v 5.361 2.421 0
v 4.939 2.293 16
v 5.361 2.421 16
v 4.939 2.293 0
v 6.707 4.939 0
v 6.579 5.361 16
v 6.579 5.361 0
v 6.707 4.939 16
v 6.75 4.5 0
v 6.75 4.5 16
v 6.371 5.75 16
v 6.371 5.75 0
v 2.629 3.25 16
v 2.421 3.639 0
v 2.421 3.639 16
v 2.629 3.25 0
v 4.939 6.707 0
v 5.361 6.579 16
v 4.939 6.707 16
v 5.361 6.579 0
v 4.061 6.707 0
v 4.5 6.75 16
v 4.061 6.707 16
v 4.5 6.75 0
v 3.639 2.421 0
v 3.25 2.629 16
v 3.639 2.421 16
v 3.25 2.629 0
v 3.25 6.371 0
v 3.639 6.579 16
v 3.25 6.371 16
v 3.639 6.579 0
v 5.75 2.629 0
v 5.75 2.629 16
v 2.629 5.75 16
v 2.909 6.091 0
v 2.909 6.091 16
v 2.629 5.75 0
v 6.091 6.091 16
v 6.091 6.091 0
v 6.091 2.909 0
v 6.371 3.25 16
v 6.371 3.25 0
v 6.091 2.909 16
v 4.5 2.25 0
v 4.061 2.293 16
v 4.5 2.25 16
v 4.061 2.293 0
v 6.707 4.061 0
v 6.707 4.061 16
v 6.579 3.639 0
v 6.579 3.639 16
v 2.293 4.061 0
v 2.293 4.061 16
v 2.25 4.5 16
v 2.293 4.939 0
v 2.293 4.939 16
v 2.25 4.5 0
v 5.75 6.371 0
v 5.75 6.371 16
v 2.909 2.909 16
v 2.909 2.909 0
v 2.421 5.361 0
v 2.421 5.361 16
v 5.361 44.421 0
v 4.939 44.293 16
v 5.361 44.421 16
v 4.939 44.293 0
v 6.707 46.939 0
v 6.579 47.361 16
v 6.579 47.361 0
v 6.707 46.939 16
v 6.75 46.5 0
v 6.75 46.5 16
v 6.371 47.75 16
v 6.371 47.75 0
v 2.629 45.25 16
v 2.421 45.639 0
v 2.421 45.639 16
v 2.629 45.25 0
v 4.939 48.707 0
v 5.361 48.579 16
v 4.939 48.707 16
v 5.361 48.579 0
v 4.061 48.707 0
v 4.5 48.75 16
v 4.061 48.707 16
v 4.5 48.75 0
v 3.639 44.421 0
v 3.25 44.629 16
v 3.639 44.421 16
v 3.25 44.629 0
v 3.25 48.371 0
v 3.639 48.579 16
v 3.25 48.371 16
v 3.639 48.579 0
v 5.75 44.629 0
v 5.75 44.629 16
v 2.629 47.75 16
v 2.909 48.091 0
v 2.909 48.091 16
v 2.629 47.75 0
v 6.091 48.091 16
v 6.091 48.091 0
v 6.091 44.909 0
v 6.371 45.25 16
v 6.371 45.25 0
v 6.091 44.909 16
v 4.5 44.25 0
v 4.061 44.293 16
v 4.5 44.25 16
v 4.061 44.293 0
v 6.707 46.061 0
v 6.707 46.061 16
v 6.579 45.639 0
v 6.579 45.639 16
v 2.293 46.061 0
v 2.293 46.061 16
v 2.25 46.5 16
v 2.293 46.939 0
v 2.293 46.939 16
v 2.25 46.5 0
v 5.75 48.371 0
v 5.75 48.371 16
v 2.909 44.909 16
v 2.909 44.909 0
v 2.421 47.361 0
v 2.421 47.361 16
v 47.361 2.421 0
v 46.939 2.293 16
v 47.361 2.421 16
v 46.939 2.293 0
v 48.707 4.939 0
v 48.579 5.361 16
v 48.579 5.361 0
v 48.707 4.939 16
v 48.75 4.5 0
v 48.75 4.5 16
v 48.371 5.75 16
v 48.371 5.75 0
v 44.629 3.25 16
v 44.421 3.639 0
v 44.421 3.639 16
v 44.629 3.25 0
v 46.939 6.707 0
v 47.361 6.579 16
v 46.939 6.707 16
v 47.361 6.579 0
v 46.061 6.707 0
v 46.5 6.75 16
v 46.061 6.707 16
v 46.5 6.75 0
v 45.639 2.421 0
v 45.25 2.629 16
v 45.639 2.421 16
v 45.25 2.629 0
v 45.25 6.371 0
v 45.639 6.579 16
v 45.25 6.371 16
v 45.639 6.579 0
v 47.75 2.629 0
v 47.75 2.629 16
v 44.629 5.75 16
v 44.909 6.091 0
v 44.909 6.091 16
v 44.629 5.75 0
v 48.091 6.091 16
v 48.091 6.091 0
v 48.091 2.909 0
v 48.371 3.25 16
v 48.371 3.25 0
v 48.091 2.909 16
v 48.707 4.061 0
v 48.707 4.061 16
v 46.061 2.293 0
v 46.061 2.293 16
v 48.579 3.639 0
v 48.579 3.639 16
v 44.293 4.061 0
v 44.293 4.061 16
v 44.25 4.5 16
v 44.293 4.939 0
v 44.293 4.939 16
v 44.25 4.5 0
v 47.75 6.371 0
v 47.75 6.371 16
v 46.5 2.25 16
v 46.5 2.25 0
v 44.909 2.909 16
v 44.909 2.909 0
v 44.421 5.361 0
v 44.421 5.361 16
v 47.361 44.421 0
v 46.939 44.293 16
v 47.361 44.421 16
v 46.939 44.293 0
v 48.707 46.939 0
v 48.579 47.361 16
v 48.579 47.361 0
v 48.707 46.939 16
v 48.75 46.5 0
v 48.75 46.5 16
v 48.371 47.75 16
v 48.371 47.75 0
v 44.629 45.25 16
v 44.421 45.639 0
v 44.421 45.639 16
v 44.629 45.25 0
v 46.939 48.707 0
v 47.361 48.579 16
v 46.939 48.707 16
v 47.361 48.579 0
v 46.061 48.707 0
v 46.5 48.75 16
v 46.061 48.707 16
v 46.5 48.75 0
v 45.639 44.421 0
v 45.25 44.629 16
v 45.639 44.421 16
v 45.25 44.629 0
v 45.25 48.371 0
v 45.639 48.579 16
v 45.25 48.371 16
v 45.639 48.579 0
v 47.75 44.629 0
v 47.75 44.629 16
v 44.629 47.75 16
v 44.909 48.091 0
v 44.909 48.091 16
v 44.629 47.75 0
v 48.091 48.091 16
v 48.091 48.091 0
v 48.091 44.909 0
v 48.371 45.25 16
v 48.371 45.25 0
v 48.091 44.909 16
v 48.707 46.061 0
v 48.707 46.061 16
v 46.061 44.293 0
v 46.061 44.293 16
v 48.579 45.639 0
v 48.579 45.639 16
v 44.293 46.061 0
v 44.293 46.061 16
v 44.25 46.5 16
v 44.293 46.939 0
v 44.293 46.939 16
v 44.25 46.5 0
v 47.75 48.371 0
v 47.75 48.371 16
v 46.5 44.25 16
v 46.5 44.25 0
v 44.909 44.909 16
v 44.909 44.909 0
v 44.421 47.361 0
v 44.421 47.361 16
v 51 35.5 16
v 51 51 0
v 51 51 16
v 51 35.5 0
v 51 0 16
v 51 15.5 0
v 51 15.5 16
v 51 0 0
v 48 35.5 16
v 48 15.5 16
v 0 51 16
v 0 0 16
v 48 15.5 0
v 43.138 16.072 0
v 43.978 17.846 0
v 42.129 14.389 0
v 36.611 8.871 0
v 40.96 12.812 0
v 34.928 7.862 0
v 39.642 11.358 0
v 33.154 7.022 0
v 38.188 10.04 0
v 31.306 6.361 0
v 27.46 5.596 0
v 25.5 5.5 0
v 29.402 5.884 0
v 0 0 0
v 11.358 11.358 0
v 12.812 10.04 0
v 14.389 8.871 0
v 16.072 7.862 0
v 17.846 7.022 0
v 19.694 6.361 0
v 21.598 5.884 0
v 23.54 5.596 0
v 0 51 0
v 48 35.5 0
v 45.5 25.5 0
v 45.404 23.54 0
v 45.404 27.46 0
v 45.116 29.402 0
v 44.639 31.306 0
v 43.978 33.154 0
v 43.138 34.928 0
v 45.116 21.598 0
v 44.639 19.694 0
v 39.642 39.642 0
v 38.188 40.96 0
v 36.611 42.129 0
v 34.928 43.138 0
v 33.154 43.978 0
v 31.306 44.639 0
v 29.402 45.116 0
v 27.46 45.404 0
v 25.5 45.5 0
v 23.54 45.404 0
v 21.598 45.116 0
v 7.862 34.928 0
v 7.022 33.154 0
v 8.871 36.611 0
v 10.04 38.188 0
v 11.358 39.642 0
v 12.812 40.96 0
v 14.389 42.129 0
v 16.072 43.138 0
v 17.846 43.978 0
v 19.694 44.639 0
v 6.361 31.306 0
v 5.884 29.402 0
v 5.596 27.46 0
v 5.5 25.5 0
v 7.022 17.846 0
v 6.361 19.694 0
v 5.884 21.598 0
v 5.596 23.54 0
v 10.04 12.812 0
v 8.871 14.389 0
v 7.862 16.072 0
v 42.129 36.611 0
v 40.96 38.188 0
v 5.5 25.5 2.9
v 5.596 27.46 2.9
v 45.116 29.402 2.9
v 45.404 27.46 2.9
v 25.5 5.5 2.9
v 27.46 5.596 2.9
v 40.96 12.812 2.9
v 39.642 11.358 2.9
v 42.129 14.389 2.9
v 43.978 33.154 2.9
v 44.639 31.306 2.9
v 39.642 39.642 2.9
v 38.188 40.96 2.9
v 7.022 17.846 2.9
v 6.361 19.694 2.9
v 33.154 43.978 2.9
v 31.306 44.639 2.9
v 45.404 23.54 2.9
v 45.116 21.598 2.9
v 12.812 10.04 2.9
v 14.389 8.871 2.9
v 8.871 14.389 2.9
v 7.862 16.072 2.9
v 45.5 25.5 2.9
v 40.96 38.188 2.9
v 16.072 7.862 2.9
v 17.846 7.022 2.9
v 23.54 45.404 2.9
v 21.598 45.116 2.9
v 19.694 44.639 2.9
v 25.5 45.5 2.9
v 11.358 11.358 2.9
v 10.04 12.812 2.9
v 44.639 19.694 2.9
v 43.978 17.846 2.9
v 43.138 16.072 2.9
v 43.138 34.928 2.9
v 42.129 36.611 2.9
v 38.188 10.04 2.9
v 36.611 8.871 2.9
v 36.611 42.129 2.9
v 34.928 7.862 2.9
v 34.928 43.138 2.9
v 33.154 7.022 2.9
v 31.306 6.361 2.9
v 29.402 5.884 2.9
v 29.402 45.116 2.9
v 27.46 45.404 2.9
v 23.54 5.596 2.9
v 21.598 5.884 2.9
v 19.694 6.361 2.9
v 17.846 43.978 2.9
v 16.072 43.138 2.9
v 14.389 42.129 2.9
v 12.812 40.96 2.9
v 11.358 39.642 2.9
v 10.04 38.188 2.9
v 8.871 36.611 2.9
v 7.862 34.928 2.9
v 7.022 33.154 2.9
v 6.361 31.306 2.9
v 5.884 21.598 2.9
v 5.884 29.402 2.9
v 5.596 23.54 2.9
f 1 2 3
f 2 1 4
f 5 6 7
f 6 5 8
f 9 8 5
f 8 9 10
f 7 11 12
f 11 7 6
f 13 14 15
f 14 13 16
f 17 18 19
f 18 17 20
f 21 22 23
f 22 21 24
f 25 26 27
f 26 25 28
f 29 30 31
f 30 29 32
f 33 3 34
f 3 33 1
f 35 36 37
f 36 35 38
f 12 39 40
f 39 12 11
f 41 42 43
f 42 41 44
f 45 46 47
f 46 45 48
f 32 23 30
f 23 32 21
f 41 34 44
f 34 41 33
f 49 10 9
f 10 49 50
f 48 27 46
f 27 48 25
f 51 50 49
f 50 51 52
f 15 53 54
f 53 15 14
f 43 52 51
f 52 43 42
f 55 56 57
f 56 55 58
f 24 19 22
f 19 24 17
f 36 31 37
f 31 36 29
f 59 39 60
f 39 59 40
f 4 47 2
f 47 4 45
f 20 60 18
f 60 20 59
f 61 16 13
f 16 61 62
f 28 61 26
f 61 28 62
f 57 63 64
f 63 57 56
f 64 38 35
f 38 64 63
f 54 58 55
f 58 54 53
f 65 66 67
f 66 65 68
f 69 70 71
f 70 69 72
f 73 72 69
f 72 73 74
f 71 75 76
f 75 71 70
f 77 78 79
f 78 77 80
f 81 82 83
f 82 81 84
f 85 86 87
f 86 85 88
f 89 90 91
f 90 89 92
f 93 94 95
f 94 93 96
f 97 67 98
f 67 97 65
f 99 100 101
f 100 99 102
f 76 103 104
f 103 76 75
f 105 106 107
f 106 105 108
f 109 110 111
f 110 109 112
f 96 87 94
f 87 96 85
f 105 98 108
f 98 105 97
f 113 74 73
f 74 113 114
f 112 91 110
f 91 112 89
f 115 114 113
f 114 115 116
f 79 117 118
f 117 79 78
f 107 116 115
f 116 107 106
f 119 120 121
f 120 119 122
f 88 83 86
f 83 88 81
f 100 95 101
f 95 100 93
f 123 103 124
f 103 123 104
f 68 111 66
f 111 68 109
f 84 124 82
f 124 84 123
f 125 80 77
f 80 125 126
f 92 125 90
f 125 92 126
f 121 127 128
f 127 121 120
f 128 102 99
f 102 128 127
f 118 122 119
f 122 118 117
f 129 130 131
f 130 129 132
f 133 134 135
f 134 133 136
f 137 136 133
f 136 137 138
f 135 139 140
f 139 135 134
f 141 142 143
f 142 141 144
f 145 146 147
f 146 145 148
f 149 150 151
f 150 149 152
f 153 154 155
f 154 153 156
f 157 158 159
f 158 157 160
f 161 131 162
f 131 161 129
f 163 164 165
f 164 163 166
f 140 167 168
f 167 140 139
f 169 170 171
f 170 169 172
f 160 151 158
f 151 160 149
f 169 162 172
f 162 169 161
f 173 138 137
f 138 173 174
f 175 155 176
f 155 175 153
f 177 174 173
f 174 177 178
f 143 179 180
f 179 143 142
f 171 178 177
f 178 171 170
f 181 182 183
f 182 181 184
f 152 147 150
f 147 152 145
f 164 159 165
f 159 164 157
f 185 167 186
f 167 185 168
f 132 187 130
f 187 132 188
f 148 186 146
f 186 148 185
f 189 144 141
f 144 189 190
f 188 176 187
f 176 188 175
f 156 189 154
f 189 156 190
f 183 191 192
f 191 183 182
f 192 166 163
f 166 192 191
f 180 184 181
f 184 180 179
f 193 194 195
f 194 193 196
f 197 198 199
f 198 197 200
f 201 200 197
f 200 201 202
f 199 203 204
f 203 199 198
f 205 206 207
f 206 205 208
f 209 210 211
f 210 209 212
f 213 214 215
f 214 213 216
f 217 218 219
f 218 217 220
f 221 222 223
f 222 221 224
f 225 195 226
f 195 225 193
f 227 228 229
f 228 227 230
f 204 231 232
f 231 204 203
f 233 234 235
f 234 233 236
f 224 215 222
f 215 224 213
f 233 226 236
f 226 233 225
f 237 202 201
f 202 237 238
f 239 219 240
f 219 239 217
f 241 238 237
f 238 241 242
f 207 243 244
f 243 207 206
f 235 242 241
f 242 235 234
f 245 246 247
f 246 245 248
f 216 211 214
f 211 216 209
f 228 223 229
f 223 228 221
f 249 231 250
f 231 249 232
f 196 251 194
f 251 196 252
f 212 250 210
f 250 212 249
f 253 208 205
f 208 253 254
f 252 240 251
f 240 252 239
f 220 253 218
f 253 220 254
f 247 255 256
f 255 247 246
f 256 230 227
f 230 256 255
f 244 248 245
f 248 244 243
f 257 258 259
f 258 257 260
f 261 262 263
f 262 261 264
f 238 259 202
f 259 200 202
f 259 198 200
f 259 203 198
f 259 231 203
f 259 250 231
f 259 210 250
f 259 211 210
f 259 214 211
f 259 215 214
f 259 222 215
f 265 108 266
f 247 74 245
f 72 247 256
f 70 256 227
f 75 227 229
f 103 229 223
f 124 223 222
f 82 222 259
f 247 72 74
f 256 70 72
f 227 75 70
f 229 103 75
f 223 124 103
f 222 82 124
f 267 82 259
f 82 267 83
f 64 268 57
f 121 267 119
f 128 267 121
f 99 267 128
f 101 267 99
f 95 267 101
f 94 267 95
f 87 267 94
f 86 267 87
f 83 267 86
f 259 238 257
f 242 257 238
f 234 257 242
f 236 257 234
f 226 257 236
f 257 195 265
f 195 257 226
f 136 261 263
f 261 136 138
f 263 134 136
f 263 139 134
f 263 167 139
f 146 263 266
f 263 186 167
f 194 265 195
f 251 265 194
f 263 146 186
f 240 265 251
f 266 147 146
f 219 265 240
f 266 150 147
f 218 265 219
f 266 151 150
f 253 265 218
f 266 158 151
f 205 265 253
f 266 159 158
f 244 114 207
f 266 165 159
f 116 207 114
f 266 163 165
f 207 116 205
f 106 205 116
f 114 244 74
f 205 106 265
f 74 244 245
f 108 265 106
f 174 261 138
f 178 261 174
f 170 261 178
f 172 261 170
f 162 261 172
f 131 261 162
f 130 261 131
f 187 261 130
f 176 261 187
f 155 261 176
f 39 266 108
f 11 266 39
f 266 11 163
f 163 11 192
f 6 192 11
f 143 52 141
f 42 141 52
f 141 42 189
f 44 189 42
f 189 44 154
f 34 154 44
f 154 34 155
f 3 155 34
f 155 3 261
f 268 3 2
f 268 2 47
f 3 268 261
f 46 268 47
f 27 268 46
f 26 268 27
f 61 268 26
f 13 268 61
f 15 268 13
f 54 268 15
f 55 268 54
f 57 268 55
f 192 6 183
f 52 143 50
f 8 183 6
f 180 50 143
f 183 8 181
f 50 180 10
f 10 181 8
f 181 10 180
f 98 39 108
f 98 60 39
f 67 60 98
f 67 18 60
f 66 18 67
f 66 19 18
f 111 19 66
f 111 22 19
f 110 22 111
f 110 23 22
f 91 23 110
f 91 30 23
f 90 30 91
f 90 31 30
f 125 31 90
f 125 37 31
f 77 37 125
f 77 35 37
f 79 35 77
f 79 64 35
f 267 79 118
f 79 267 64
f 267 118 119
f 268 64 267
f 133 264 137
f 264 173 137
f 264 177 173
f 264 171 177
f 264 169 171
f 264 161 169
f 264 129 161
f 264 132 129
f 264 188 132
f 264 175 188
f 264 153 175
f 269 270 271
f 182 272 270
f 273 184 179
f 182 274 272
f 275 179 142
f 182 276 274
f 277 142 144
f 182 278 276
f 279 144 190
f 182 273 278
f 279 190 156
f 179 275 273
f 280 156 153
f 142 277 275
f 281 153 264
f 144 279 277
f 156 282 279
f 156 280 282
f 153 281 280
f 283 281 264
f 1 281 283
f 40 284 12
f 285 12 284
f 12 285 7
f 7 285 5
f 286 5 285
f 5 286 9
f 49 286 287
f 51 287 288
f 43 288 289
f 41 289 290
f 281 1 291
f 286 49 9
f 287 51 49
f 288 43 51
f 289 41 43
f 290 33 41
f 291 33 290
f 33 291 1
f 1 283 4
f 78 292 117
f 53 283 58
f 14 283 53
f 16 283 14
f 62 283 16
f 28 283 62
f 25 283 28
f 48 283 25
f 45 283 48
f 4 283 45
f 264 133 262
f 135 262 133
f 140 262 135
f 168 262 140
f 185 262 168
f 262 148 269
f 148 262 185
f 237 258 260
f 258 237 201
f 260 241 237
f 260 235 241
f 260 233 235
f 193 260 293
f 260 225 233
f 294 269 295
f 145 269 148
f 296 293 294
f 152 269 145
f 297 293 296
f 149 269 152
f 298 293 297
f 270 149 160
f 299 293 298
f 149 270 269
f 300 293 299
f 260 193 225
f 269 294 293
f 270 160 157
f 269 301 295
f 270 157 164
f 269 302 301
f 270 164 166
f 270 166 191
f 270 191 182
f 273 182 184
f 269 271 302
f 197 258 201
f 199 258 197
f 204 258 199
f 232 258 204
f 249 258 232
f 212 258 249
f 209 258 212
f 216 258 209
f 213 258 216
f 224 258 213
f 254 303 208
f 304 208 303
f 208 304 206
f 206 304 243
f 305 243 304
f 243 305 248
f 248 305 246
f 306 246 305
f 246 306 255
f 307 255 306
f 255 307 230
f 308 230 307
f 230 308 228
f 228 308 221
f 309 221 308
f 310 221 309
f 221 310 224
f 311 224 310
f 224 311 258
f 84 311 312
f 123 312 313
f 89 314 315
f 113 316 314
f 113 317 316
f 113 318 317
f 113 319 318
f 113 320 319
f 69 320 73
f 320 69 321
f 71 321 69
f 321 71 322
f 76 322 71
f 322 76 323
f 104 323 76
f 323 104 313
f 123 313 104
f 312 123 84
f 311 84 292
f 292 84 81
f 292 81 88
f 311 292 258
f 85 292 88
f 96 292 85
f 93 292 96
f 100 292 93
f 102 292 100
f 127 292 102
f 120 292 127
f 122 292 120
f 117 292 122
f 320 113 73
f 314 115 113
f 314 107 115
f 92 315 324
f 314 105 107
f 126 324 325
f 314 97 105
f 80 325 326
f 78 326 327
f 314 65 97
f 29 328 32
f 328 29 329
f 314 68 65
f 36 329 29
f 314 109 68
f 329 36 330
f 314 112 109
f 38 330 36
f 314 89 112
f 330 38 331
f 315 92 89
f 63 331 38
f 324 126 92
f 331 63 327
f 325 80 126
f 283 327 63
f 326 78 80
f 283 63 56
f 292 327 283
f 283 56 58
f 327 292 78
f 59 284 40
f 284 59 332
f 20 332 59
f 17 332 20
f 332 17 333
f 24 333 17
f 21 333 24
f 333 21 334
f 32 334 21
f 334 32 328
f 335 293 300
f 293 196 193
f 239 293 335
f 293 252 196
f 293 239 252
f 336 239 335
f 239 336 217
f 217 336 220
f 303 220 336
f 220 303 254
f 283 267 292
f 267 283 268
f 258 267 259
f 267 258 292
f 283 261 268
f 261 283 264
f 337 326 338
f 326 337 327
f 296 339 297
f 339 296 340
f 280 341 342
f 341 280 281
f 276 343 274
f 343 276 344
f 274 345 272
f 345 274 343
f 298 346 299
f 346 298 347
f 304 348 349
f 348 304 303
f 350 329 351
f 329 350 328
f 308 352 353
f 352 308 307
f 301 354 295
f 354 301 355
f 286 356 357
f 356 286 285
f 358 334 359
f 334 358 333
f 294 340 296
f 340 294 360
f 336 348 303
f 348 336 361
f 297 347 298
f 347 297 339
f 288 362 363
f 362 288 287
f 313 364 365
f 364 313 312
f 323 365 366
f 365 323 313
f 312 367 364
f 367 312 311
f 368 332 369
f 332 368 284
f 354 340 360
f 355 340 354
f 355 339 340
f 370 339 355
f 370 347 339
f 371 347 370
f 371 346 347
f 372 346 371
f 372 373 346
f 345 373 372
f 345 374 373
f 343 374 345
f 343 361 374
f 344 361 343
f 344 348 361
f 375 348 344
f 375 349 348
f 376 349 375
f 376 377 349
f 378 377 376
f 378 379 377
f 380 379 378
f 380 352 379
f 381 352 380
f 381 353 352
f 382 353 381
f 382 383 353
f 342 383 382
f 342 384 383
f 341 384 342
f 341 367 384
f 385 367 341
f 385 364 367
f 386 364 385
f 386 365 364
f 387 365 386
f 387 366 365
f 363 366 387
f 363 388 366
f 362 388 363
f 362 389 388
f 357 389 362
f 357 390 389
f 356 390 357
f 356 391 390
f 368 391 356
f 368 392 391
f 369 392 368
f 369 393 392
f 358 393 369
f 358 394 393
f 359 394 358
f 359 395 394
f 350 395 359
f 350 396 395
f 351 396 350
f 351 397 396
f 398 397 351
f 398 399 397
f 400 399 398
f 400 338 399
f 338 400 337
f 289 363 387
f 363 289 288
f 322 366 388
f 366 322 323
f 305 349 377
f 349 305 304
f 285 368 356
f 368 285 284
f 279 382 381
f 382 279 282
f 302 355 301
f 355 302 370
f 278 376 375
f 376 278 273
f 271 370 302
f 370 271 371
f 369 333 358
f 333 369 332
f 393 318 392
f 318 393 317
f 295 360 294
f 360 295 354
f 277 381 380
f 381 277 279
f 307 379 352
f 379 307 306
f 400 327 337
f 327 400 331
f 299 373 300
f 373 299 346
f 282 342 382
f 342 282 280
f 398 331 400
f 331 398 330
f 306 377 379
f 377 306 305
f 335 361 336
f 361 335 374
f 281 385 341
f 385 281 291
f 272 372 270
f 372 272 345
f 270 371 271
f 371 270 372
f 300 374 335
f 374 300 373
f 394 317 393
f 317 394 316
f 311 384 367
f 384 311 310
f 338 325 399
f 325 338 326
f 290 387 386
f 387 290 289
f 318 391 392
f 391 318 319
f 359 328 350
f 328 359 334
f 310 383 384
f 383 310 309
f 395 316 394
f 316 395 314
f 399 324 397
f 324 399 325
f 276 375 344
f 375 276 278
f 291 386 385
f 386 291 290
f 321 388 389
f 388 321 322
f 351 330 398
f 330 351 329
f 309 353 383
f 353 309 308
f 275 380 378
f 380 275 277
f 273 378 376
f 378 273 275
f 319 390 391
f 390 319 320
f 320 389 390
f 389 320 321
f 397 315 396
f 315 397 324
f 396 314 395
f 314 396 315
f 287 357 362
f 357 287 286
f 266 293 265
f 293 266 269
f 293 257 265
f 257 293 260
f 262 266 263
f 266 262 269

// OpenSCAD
/* =============================================================================
 * 智慧香爐 — 外購元件：5015 鼓風機
 * =============================================================================
 * ★★ 這不是列印件，是外購品的示意模型 ★★
 * 尺寸來自 ../params.scad，外形取自 params.scad 的 FAN_*（標稱值放餘量後的估值）。
 * 用途：組裝干涉檢查、螺絲可及性、目視確認裝得下。
 * ★不可當成實際尺寸寫進報告★（CLAUDE.md §7）
 *
 * 原點：本體左下角、z=0 為進氣面
 * ============================================================================= */

include <../params.scad>


// 離心式：軸向進氣（-z 面）、徑向出風（+x 面）
module blower_5015() {
    difference() {
        // 本體外緣就是標稱外形，★不畫外凸的出風嘴★——
        // 那是猜的，畫上去會在干涉檢查裡製造假陽性。
        color("#3a3f45") cube([FAN_W, FAN_H, FAN_T]);
        // 軸向進氣口（-z 面；裝進風扇座時會被鏡射成朝向煙道那一側）
        translate([FAN_W / 2, FAN_H / 2, -0.1])
            cylinder(h = 3, d = FAN_INLET_D, $fn = 64);
        // 徑向出風口（+x 面的開口，不外凸）
        translate([FAN_W - 3, FAN_H / 2 - FAN_OUT_H / 2, FAN_T / 2 - FAN_OUT_W / 2])
            cube([4, FAN_OUT_H, FAN_OUT_W]);
        // 安裝孔（M4 通孔——耳孔多為 ⌀4，★請實測★）
        for (x = [-1, 1], y = [-1, 1])
            translate([FAN_W / 2 + x * FAN_SCREW_S / 2,
                       FAN_H / 2 + y * FAN_SCREW_S / 2, -0.1])
                cylinder(h = FAN_T + 0.2, d = M4_CLEAR, $fn = 32);
    }
    // 葉輪（示意）
    color("#20242a") translate([FAN_W / 2, FAN_H / 2, 3])
        cylinder(h = FAN_T - 5, d = FAN_INLET_D - 4, $fn = 48);
}

// ── 單獨開檔時的預覽（被 use<> 引入時不執行）──
blower_5015();
